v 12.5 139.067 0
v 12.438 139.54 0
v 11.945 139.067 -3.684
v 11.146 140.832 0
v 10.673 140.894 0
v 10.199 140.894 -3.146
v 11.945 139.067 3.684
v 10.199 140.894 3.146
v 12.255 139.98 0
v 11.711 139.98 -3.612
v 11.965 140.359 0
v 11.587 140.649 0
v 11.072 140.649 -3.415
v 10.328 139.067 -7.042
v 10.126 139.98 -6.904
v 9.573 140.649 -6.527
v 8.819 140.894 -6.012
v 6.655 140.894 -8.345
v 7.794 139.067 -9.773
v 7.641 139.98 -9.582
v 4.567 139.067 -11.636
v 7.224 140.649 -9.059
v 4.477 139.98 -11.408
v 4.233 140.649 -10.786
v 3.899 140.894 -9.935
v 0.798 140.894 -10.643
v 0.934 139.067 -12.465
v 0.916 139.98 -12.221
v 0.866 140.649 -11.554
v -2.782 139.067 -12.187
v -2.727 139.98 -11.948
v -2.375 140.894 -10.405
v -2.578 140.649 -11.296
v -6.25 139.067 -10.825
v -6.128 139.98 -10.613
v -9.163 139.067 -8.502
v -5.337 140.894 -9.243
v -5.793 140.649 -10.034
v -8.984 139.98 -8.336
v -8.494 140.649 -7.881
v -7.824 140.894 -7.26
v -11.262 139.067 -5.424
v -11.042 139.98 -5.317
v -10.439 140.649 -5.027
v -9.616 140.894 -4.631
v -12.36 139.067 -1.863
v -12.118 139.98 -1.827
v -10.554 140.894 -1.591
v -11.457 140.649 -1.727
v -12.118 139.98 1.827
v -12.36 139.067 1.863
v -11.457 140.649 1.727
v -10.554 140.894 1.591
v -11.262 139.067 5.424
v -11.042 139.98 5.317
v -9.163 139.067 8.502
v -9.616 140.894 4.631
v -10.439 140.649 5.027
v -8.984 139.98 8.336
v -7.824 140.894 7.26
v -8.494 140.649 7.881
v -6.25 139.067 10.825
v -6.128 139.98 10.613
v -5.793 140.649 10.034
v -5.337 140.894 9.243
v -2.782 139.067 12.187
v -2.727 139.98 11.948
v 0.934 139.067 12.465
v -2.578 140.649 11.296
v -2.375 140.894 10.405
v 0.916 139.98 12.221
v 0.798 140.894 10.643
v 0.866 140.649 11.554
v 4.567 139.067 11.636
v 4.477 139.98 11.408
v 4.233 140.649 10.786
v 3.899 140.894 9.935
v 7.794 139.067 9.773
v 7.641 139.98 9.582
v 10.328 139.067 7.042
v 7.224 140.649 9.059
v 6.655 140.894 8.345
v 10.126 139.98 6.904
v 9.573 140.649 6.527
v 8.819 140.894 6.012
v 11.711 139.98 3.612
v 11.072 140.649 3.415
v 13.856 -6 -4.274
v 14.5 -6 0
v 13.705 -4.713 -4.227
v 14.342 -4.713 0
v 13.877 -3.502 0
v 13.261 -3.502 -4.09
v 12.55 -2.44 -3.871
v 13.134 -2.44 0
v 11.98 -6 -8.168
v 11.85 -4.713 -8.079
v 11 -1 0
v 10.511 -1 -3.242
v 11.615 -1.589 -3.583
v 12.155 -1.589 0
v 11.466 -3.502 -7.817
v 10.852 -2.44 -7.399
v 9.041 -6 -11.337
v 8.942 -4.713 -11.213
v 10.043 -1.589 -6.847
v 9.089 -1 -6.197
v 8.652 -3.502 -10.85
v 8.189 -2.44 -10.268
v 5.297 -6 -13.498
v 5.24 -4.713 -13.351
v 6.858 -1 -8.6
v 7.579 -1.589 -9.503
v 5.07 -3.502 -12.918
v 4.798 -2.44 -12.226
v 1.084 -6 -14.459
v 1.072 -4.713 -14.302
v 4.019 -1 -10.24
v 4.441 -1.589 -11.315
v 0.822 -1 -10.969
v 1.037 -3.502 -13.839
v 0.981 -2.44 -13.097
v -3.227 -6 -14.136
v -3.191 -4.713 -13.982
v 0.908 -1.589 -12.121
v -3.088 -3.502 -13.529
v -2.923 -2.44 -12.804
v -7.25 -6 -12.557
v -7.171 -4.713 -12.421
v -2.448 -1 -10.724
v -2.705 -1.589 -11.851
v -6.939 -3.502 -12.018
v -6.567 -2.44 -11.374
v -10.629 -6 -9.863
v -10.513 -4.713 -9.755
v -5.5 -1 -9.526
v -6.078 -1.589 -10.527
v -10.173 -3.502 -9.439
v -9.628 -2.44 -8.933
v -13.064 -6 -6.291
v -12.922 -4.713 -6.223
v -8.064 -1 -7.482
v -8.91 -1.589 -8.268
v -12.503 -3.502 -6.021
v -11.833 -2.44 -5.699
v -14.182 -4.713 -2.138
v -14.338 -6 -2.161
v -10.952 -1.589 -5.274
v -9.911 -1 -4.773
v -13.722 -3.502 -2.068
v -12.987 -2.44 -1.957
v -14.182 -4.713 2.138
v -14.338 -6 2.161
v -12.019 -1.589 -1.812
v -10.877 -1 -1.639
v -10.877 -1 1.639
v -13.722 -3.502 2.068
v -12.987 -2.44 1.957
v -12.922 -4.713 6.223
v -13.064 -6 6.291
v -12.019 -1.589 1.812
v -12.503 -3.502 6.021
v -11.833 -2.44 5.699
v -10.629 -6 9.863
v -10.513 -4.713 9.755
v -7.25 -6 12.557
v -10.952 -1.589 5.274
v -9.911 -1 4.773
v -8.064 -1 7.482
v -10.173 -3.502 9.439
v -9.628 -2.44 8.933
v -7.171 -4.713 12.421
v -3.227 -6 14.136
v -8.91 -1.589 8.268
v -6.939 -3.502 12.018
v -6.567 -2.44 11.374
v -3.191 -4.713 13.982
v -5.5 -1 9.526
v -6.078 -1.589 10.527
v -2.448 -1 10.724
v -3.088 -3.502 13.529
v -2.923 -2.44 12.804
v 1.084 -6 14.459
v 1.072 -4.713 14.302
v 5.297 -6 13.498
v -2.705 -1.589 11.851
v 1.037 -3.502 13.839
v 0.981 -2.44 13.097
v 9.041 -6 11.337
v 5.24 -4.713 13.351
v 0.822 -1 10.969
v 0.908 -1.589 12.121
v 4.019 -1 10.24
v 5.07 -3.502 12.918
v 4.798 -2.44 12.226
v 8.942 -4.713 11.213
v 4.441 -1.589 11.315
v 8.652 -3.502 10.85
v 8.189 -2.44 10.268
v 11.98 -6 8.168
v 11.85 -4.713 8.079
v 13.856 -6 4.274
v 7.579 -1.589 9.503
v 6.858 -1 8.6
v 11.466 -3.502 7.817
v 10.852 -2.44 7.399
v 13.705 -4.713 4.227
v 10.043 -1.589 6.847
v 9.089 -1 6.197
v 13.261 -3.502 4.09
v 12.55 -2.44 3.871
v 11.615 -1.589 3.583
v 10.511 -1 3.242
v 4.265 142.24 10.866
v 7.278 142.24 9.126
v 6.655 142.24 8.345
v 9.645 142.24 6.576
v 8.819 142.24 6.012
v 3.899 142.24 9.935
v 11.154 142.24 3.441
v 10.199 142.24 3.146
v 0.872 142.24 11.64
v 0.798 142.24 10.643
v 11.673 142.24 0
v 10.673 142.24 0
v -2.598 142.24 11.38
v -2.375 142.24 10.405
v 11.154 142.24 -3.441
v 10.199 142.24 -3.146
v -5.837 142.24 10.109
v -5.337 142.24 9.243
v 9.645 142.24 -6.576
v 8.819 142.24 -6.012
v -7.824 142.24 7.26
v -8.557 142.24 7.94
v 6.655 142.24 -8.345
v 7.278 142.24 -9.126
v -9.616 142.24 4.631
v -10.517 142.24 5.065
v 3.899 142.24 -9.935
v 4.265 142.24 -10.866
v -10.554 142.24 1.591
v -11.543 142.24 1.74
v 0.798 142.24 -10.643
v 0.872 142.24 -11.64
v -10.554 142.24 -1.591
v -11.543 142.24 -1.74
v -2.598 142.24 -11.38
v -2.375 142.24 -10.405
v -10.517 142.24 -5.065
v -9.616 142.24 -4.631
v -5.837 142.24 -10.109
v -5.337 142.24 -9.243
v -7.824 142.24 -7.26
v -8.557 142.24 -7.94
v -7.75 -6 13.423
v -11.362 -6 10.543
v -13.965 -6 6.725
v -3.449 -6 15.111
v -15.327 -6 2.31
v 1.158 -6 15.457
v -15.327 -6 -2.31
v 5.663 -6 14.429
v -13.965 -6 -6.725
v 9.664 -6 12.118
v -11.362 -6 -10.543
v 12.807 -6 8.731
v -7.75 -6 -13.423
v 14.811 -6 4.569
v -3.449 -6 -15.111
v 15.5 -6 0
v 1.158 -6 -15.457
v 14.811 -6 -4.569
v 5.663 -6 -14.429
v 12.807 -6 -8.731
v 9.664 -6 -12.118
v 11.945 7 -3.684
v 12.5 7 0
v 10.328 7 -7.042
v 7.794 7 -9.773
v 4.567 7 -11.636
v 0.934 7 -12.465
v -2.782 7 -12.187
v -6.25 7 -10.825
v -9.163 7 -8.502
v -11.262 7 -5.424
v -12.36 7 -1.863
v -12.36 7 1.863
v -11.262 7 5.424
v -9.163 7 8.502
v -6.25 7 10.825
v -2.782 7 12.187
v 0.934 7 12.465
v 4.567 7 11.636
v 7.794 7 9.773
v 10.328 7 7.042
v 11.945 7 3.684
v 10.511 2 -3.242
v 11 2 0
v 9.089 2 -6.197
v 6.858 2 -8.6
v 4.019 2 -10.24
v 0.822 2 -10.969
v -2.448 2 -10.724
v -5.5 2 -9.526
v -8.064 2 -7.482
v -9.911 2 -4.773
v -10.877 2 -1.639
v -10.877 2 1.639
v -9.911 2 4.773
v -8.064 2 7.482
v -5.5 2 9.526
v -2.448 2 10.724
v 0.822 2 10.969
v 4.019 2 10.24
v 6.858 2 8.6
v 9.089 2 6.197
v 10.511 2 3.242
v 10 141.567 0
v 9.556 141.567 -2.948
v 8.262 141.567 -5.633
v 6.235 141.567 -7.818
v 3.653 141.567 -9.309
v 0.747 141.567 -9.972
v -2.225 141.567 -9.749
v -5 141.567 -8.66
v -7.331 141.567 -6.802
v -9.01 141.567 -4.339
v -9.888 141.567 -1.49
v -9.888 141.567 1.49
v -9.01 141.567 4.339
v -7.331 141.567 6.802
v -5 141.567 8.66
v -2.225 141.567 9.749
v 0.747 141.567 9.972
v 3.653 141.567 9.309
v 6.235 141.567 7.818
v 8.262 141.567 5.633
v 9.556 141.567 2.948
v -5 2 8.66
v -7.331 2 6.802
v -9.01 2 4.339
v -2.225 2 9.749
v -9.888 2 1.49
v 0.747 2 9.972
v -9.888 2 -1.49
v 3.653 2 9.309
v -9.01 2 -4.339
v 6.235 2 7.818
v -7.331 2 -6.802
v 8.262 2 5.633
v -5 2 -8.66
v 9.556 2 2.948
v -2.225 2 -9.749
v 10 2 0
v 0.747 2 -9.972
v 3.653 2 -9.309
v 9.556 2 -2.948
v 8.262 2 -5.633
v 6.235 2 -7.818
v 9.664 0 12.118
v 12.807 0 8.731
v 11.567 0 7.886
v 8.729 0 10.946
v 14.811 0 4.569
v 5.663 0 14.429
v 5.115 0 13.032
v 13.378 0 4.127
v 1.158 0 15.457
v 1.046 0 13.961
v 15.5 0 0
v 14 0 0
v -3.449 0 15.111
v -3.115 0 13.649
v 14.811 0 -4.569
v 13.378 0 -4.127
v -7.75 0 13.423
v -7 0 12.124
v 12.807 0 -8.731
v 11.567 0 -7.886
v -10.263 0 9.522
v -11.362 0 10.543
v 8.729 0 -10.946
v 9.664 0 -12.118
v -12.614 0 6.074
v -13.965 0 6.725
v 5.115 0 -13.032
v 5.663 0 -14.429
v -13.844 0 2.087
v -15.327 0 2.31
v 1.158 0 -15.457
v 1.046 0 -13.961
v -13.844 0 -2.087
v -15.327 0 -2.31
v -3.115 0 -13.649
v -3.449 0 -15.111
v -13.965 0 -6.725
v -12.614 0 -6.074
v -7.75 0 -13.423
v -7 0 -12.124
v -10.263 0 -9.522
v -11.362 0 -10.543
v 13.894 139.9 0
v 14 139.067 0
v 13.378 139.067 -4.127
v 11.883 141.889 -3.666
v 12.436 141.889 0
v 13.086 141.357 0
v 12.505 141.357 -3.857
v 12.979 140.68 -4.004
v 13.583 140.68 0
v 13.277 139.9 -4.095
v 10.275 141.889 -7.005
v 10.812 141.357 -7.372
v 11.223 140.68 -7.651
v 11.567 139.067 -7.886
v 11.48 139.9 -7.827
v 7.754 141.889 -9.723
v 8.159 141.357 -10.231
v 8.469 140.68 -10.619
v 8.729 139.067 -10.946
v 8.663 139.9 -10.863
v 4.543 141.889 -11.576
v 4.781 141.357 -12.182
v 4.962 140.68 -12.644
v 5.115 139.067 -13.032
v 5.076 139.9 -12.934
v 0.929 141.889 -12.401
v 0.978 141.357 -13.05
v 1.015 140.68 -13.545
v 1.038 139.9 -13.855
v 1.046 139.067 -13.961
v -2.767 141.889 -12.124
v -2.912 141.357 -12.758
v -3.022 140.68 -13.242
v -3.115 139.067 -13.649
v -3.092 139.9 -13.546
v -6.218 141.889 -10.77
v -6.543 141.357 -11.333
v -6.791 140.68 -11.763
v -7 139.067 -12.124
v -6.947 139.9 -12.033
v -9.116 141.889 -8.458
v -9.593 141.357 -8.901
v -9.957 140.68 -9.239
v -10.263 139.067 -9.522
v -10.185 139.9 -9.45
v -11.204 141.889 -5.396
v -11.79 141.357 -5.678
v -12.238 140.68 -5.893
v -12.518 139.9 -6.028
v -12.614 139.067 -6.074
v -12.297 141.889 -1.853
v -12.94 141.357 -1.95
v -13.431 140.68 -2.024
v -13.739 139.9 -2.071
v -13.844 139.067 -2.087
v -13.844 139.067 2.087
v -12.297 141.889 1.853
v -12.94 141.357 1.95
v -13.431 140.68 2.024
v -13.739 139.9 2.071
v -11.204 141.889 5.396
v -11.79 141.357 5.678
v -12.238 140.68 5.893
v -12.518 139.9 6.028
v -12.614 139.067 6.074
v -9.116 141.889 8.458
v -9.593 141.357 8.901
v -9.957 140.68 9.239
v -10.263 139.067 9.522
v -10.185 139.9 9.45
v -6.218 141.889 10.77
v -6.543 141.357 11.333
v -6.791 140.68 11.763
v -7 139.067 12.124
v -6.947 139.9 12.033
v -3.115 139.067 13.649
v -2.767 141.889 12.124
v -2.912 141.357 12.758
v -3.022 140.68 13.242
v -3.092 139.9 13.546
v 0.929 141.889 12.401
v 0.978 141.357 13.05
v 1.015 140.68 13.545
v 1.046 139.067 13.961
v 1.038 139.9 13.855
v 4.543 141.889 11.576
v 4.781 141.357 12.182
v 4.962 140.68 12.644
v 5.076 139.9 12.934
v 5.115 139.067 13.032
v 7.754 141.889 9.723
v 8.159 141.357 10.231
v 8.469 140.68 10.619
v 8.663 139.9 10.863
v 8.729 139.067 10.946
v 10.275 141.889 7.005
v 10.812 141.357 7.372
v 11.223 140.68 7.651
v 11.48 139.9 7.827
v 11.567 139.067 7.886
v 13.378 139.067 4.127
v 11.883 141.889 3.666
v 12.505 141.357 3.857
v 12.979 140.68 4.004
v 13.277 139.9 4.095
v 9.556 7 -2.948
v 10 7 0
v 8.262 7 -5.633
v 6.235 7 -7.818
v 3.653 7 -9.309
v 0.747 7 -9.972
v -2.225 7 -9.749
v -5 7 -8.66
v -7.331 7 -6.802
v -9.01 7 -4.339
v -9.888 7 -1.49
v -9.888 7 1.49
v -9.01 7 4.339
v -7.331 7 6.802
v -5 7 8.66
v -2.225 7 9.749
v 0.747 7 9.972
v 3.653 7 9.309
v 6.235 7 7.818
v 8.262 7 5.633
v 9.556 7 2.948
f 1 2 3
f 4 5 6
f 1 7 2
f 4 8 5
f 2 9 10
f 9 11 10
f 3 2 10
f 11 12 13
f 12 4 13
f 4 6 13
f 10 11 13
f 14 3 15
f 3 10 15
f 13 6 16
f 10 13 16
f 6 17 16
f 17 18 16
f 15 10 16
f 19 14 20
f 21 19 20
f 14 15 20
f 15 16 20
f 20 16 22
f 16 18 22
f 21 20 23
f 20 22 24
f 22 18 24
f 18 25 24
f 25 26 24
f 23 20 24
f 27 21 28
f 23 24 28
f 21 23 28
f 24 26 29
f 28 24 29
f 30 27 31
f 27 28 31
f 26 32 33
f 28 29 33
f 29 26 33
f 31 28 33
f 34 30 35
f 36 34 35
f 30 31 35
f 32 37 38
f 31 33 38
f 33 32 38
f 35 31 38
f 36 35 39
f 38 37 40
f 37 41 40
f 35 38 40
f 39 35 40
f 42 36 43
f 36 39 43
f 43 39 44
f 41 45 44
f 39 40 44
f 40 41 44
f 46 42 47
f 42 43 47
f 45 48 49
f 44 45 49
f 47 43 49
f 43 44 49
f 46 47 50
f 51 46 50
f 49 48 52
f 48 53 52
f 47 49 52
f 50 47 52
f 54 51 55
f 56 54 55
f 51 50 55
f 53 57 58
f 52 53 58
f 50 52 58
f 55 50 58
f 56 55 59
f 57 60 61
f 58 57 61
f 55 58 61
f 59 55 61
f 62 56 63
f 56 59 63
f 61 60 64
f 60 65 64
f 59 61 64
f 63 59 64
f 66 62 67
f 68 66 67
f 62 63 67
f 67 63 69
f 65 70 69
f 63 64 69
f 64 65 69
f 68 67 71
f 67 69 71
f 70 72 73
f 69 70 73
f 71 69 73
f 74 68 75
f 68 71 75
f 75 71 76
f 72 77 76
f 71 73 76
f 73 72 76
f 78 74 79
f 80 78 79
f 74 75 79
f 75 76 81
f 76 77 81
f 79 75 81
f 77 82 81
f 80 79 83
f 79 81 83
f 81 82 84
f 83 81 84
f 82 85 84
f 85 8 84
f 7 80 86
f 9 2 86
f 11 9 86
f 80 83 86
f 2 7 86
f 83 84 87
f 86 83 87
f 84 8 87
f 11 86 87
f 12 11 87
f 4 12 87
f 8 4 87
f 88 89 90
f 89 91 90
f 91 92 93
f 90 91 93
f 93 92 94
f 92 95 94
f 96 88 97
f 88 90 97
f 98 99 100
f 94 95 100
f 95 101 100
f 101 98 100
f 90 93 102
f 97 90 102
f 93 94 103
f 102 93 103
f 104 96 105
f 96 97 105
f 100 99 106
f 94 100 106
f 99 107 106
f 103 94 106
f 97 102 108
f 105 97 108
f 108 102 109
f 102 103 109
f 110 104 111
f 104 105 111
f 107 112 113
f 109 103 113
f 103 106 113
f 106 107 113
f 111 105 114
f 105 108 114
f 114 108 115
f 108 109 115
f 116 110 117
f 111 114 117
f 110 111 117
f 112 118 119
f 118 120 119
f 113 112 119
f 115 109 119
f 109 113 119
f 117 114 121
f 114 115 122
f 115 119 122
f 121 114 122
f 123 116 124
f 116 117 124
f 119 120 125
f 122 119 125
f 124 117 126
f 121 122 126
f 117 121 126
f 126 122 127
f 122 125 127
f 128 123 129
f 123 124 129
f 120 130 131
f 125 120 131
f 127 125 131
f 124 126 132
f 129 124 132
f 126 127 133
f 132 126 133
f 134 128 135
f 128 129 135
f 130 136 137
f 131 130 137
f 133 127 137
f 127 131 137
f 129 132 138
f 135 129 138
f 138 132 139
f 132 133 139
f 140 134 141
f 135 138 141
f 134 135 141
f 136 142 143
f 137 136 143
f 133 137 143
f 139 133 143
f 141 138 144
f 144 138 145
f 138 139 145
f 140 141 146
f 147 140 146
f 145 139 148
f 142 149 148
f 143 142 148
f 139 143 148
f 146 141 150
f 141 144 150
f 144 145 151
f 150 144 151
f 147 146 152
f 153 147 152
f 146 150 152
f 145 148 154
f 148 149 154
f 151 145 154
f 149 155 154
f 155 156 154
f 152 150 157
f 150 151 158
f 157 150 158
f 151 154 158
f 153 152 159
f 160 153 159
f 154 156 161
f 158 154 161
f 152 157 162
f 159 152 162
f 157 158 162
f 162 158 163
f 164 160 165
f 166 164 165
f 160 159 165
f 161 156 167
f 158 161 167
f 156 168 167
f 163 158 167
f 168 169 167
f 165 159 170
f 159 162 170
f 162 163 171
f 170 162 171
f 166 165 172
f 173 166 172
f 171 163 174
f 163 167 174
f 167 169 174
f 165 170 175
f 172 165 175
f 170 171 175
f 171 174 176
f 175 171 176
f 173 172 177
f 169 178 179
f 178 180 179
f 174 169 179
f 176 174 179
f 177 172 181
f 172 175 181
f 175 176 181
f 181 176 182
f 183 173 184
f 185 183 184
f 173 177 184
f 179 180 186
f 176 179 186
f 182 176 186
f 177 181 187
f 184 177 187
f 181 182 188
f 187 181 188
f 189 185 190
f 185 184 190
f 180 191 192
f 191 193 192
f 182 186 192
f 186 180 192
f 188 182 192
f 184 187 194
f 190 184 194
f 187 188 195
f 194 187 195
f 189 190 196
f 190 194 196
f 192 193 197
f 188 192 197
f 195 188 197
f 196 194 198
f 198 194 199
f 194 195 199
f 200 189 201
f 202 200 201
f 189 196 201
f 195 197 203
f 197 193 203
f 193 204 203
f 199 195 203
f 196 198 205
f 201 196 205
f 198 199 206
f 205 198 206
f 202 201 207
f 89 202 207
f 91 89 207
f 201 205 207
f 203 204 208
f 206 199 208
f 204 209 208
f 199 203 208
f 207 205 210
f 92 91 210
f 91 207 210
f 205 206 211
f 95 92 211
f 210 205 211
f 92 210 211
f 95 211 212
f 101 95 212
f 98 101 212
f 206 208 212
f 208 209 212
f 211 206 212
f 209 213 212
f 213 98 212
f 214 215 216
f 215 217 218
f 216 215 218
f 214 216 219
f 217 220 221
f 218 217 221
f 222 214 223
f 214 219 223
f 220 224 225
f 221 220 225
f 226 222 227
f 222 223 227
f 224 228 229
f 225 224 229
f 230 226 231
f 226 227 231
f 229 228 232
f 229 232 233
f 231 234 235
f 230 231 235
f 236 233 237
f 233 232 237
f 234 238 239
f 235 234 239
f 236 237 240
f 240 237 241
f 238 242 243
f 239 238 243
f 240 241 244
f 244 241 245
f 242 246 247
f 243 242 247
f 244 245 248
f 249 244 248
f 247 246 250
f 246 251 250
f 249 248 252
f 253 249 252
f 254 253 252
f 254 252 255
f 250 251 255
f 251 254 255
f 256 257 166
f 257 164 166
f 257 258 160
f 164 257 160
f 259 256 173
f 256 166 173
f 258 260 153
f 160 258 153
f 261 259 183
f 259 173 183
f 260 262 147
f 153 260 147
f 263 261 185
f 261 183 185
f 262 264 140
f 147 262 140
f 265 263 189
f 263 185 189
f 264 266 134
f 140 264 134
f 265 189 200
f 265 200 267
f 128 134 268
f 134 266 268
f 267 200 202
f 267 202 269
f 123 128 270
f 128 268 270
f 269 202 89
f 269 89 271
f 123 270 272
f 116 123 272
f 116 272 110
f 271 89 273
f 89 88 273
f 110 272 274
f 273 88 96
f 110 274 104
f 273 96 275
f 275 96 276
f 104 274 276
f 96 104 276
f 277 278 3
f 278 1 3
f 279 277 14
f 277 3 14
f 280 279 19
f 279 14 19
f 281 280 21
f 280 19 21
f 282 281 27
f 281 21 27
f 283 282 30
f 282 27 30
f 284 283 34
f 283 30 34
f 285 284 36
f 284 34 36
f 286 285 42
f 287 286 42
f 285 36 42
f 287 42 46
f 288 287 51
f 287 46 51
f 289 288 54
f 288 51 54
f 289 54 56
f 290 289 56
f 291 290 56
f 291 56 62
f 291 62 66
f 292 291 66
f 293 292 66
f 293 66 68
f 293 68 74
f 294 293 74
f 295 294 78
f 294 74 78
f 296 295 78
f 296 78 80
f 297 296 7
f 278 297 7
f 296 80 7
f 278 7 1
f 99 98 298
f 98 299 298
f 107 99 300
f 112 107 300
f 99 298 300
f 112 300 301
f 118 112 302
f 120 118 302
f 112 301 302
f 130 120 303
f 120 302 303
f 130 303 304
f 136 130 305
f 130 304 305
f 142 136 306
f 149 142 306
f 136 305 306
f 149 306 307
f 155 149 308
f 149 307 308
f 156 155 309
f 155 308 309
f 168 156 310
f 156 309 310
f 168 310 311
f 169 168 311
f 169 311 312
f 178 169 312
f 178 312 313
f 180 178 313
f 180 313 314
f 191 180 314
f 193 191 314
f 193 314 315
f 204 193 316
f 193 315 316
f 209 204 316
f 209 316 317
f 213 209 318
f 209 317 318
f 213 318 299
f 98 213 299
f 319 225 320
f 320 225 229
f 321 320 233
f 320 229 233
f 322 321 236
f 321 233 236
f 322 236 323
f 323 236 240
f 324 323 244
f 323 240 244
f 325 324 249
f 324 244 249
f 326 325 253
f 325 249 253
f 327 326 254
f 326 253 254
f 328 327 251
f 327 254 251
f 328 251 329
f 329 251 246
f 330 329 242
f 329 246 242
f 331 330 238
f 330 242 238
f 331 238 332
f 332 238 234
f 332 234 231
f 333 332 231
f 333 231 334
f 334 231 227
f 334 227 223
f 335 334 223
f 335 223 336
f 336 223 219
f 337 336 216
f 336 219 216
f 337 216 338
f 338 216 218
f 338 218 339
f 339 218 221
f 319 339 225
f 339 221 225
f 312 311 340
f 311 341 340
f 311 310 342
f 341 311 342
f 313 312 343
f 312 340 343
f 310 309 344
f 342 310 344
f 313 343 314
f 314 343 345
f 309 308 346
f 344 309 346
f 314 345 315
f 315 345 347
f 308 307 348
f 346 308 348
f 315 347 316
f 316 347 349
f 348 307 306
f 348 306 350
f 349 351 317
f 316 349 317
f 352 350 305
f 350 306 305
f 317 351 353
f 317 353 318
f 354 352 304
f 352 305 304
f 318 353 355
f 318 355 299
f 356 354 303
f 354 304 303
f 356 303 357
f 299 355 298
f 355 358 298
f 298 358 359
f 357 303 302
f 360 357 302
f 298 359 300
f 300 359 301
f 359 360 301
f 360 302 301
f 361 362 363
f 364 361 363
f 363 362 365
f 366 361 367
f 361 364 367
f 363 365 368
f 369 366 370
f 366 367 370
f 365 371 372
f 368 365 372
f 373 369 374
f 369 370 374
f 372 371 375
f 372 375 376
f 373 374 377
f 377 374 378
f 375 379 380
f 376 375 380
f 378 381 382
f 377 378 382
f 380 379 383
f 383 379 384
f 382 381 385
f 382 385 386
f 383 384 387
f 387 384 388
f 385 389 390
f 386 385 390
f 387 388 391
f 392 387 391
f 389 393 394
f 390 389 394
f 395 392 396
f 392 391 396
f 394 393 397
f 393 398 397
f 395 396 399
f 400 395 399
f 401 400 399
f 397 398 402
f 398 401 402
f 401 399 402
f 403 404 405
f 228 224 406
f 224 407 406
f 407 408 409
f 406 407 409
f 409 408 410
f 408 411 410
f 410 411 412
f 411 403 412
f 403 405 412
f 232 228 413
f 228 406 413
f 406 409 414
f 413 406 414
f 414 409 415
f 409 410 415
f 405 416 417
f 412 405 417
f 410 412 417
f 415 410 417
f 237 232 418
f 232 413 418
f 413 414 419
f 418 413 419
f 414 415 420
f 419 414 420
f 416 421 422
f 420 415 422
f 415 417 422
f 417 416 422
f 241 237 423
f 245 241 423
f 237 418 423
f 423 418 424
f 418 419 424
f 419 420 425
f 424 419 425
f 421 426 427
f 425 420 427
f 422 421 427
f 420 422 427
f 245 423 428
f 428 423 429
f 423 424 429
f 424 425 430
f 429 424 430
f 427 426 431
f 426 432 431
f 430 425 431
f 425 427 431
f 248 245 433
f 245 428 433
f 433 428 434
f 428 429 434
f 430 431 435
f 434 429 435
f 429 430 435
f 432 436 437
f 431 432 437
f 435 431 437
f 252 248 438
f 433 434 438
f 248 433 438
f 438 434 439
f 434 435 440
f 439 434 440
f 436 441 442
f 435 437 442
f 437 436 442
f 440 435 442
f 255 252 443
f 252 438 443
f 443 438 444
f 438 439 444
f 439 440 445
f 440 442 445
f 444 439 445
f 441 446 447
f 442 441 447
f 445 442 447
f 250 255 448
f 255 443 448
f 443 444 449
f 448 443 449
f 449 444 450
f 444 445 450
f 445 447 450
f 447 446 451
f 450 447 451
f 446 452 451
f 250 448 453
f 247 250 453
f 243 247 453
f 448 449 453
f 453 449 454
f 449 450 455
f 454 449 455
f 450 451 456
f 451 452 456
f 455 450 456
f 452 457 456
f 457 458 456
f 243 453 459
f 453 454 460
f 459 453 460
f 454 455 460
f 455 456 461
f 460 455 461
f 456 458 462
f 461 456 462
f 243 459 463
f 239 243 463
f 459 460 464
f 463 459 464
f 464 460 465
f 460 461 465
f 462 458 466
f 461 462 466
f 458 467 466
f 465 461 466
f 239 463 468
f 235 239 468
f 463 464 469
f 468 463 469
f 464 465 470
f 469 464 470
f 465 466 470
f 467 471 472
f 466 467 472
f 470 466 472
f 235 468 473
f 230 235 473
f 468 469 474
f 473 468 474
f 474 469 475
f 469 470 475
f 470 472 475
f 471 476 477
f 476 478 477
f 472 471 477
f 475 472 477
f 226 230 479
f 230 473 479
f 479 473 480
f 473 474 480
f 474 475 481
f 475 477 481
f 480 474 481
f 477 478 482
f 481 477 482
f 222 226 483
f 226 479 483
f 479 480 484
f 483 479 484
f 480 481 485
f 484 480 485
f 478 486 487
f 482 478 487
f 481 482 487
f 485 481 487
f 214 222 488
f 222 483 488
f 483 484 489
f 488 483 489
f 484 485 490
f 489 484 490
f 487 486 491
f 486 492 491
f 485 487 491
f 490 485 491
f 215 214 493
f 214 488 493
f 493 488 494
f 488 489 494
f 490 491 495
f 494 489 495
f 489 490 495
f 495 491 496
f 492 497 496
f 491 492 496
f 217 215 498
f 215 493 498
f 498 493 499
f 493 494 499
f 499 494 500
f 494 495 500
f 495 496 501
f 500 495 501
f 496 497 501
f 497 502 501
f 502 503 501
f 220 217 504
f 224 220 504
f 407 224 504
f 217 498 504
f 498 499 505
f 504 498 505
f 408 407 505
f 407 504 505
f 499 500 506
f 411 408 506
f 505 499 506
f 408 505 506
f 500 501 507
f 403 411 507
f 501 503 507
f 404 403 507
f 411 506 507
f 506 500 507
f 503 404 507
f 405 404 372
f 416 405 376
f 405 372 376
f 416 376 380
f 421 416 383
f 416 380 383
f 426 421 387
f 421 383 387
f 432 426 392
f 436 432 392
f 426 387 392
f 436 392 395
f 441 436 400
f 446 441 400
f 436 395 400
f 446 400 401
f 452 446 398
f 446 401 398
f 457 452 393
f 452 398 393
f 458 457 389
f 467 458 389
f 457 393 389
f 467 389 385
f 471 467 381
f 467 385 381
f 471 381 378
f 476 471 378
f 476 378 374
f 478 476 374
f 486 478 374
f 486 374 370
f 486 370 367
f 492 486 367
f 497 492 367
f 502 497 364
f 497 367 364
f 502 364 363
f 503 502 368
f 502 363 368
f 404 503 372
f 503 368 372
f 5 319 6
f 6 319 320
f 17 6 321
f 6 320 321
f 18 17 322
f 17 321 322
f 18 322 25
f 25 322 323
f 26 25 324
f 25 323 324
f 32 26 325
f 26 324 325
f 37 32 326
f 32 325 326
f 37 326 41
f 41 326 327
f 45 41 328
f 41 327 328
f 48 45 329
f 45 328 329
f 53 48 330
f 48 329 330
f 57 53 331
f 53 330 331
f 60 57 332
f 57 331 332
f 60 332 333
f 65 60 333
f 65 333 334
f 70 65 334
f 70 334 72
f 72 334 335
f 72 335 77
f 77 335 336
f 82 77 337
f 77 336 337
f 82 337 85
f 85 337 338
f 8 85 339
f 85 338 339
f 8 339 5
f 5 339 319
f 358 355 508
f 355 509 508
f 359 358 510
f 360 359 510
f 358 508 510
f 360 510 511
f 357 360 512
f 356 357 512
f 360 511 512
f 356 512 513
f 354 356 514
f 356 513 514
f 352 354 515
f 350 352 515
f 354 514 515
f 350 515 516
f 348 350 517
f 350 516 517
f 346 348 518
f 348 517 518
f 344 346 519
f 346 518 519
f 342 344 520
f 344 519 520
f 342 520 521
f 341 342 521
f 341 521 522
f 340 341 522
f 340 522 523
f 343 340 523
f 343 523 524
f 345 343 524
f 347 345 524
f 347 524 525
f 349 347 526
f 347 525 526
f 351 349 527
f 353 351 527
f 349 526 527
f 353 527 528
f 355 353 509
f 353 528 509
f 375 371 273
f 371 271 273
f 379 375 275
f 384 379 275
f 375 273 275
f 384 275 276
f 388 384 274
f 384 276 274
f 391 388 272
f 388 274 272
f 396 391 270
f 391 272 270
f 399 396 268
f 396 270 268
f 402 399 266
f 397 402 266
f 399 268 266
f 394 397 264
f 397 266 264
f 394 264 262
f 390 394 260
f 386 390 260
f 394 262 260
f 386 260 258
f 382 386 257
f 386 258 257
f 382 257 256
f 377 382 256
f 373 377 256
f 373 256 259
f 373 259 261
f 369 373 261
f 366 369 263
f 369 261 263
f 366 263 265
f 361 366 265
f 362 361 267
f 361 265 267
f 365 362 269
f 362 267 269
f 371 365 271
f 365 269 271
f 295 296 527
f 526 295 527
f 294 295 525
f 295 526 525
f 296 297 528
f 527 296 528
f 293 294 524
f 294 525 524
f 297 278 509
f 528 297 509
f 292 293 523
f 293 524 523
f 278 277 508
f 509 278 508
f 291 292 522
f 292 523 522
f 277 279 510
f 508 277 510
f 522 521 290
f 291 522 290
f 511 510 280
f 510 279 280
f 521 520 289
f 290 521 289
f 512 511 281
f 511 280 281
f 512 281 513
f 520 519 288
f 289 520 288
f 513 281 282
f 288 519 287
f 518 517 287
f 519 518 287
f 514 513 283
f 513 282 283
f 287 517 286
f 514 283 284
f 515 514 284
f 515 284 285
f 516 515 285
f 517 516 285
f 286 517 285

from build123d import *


with BuildPart() as part:
    # Sketch1 → Revolve1 (revolve)
    with BuildSketch(Plane.XY):
        with BuildLine():
            Line((12.5, 7), (12.5, 139.066923077))
            ThreePointArc((12.5, 139.066923077), (11.964906619, 140.358752773), (10.673076923, 140.893846154))
            Line((10.673076923, 140.893846154), (10, 141.566923077))
            Line((10, 141.566923077), (10.673076923, 142.24))
            Line((10.673076923, 142.24), (11.673076923, 142.24))
            ThreePointArc((11.673076923, 142.24), (13.355924313, 141.034344496), (14, 139.066923077))
            Line((14, 139.066923077), (14, 0))
            Line((14, 0), (15.5, 0))
            Line((15.5, 0), (15.5, -6))
            Line((15.5, -6), (14.5, -6))
            ThreePointArc((14.5, -6), (13.538055577, -2.948361096), (11, -1))
            Line((11, -1), (11, 2))
            Line((11, 2), (10, 2))
            Line((10, 2), (10, 7))
            Line((10, 7), (12.5, 7))
        make_face()
    revolve(axis=Axis((0, -1085.204253018, 0), (0, 1, 0)))


solid = part.part
